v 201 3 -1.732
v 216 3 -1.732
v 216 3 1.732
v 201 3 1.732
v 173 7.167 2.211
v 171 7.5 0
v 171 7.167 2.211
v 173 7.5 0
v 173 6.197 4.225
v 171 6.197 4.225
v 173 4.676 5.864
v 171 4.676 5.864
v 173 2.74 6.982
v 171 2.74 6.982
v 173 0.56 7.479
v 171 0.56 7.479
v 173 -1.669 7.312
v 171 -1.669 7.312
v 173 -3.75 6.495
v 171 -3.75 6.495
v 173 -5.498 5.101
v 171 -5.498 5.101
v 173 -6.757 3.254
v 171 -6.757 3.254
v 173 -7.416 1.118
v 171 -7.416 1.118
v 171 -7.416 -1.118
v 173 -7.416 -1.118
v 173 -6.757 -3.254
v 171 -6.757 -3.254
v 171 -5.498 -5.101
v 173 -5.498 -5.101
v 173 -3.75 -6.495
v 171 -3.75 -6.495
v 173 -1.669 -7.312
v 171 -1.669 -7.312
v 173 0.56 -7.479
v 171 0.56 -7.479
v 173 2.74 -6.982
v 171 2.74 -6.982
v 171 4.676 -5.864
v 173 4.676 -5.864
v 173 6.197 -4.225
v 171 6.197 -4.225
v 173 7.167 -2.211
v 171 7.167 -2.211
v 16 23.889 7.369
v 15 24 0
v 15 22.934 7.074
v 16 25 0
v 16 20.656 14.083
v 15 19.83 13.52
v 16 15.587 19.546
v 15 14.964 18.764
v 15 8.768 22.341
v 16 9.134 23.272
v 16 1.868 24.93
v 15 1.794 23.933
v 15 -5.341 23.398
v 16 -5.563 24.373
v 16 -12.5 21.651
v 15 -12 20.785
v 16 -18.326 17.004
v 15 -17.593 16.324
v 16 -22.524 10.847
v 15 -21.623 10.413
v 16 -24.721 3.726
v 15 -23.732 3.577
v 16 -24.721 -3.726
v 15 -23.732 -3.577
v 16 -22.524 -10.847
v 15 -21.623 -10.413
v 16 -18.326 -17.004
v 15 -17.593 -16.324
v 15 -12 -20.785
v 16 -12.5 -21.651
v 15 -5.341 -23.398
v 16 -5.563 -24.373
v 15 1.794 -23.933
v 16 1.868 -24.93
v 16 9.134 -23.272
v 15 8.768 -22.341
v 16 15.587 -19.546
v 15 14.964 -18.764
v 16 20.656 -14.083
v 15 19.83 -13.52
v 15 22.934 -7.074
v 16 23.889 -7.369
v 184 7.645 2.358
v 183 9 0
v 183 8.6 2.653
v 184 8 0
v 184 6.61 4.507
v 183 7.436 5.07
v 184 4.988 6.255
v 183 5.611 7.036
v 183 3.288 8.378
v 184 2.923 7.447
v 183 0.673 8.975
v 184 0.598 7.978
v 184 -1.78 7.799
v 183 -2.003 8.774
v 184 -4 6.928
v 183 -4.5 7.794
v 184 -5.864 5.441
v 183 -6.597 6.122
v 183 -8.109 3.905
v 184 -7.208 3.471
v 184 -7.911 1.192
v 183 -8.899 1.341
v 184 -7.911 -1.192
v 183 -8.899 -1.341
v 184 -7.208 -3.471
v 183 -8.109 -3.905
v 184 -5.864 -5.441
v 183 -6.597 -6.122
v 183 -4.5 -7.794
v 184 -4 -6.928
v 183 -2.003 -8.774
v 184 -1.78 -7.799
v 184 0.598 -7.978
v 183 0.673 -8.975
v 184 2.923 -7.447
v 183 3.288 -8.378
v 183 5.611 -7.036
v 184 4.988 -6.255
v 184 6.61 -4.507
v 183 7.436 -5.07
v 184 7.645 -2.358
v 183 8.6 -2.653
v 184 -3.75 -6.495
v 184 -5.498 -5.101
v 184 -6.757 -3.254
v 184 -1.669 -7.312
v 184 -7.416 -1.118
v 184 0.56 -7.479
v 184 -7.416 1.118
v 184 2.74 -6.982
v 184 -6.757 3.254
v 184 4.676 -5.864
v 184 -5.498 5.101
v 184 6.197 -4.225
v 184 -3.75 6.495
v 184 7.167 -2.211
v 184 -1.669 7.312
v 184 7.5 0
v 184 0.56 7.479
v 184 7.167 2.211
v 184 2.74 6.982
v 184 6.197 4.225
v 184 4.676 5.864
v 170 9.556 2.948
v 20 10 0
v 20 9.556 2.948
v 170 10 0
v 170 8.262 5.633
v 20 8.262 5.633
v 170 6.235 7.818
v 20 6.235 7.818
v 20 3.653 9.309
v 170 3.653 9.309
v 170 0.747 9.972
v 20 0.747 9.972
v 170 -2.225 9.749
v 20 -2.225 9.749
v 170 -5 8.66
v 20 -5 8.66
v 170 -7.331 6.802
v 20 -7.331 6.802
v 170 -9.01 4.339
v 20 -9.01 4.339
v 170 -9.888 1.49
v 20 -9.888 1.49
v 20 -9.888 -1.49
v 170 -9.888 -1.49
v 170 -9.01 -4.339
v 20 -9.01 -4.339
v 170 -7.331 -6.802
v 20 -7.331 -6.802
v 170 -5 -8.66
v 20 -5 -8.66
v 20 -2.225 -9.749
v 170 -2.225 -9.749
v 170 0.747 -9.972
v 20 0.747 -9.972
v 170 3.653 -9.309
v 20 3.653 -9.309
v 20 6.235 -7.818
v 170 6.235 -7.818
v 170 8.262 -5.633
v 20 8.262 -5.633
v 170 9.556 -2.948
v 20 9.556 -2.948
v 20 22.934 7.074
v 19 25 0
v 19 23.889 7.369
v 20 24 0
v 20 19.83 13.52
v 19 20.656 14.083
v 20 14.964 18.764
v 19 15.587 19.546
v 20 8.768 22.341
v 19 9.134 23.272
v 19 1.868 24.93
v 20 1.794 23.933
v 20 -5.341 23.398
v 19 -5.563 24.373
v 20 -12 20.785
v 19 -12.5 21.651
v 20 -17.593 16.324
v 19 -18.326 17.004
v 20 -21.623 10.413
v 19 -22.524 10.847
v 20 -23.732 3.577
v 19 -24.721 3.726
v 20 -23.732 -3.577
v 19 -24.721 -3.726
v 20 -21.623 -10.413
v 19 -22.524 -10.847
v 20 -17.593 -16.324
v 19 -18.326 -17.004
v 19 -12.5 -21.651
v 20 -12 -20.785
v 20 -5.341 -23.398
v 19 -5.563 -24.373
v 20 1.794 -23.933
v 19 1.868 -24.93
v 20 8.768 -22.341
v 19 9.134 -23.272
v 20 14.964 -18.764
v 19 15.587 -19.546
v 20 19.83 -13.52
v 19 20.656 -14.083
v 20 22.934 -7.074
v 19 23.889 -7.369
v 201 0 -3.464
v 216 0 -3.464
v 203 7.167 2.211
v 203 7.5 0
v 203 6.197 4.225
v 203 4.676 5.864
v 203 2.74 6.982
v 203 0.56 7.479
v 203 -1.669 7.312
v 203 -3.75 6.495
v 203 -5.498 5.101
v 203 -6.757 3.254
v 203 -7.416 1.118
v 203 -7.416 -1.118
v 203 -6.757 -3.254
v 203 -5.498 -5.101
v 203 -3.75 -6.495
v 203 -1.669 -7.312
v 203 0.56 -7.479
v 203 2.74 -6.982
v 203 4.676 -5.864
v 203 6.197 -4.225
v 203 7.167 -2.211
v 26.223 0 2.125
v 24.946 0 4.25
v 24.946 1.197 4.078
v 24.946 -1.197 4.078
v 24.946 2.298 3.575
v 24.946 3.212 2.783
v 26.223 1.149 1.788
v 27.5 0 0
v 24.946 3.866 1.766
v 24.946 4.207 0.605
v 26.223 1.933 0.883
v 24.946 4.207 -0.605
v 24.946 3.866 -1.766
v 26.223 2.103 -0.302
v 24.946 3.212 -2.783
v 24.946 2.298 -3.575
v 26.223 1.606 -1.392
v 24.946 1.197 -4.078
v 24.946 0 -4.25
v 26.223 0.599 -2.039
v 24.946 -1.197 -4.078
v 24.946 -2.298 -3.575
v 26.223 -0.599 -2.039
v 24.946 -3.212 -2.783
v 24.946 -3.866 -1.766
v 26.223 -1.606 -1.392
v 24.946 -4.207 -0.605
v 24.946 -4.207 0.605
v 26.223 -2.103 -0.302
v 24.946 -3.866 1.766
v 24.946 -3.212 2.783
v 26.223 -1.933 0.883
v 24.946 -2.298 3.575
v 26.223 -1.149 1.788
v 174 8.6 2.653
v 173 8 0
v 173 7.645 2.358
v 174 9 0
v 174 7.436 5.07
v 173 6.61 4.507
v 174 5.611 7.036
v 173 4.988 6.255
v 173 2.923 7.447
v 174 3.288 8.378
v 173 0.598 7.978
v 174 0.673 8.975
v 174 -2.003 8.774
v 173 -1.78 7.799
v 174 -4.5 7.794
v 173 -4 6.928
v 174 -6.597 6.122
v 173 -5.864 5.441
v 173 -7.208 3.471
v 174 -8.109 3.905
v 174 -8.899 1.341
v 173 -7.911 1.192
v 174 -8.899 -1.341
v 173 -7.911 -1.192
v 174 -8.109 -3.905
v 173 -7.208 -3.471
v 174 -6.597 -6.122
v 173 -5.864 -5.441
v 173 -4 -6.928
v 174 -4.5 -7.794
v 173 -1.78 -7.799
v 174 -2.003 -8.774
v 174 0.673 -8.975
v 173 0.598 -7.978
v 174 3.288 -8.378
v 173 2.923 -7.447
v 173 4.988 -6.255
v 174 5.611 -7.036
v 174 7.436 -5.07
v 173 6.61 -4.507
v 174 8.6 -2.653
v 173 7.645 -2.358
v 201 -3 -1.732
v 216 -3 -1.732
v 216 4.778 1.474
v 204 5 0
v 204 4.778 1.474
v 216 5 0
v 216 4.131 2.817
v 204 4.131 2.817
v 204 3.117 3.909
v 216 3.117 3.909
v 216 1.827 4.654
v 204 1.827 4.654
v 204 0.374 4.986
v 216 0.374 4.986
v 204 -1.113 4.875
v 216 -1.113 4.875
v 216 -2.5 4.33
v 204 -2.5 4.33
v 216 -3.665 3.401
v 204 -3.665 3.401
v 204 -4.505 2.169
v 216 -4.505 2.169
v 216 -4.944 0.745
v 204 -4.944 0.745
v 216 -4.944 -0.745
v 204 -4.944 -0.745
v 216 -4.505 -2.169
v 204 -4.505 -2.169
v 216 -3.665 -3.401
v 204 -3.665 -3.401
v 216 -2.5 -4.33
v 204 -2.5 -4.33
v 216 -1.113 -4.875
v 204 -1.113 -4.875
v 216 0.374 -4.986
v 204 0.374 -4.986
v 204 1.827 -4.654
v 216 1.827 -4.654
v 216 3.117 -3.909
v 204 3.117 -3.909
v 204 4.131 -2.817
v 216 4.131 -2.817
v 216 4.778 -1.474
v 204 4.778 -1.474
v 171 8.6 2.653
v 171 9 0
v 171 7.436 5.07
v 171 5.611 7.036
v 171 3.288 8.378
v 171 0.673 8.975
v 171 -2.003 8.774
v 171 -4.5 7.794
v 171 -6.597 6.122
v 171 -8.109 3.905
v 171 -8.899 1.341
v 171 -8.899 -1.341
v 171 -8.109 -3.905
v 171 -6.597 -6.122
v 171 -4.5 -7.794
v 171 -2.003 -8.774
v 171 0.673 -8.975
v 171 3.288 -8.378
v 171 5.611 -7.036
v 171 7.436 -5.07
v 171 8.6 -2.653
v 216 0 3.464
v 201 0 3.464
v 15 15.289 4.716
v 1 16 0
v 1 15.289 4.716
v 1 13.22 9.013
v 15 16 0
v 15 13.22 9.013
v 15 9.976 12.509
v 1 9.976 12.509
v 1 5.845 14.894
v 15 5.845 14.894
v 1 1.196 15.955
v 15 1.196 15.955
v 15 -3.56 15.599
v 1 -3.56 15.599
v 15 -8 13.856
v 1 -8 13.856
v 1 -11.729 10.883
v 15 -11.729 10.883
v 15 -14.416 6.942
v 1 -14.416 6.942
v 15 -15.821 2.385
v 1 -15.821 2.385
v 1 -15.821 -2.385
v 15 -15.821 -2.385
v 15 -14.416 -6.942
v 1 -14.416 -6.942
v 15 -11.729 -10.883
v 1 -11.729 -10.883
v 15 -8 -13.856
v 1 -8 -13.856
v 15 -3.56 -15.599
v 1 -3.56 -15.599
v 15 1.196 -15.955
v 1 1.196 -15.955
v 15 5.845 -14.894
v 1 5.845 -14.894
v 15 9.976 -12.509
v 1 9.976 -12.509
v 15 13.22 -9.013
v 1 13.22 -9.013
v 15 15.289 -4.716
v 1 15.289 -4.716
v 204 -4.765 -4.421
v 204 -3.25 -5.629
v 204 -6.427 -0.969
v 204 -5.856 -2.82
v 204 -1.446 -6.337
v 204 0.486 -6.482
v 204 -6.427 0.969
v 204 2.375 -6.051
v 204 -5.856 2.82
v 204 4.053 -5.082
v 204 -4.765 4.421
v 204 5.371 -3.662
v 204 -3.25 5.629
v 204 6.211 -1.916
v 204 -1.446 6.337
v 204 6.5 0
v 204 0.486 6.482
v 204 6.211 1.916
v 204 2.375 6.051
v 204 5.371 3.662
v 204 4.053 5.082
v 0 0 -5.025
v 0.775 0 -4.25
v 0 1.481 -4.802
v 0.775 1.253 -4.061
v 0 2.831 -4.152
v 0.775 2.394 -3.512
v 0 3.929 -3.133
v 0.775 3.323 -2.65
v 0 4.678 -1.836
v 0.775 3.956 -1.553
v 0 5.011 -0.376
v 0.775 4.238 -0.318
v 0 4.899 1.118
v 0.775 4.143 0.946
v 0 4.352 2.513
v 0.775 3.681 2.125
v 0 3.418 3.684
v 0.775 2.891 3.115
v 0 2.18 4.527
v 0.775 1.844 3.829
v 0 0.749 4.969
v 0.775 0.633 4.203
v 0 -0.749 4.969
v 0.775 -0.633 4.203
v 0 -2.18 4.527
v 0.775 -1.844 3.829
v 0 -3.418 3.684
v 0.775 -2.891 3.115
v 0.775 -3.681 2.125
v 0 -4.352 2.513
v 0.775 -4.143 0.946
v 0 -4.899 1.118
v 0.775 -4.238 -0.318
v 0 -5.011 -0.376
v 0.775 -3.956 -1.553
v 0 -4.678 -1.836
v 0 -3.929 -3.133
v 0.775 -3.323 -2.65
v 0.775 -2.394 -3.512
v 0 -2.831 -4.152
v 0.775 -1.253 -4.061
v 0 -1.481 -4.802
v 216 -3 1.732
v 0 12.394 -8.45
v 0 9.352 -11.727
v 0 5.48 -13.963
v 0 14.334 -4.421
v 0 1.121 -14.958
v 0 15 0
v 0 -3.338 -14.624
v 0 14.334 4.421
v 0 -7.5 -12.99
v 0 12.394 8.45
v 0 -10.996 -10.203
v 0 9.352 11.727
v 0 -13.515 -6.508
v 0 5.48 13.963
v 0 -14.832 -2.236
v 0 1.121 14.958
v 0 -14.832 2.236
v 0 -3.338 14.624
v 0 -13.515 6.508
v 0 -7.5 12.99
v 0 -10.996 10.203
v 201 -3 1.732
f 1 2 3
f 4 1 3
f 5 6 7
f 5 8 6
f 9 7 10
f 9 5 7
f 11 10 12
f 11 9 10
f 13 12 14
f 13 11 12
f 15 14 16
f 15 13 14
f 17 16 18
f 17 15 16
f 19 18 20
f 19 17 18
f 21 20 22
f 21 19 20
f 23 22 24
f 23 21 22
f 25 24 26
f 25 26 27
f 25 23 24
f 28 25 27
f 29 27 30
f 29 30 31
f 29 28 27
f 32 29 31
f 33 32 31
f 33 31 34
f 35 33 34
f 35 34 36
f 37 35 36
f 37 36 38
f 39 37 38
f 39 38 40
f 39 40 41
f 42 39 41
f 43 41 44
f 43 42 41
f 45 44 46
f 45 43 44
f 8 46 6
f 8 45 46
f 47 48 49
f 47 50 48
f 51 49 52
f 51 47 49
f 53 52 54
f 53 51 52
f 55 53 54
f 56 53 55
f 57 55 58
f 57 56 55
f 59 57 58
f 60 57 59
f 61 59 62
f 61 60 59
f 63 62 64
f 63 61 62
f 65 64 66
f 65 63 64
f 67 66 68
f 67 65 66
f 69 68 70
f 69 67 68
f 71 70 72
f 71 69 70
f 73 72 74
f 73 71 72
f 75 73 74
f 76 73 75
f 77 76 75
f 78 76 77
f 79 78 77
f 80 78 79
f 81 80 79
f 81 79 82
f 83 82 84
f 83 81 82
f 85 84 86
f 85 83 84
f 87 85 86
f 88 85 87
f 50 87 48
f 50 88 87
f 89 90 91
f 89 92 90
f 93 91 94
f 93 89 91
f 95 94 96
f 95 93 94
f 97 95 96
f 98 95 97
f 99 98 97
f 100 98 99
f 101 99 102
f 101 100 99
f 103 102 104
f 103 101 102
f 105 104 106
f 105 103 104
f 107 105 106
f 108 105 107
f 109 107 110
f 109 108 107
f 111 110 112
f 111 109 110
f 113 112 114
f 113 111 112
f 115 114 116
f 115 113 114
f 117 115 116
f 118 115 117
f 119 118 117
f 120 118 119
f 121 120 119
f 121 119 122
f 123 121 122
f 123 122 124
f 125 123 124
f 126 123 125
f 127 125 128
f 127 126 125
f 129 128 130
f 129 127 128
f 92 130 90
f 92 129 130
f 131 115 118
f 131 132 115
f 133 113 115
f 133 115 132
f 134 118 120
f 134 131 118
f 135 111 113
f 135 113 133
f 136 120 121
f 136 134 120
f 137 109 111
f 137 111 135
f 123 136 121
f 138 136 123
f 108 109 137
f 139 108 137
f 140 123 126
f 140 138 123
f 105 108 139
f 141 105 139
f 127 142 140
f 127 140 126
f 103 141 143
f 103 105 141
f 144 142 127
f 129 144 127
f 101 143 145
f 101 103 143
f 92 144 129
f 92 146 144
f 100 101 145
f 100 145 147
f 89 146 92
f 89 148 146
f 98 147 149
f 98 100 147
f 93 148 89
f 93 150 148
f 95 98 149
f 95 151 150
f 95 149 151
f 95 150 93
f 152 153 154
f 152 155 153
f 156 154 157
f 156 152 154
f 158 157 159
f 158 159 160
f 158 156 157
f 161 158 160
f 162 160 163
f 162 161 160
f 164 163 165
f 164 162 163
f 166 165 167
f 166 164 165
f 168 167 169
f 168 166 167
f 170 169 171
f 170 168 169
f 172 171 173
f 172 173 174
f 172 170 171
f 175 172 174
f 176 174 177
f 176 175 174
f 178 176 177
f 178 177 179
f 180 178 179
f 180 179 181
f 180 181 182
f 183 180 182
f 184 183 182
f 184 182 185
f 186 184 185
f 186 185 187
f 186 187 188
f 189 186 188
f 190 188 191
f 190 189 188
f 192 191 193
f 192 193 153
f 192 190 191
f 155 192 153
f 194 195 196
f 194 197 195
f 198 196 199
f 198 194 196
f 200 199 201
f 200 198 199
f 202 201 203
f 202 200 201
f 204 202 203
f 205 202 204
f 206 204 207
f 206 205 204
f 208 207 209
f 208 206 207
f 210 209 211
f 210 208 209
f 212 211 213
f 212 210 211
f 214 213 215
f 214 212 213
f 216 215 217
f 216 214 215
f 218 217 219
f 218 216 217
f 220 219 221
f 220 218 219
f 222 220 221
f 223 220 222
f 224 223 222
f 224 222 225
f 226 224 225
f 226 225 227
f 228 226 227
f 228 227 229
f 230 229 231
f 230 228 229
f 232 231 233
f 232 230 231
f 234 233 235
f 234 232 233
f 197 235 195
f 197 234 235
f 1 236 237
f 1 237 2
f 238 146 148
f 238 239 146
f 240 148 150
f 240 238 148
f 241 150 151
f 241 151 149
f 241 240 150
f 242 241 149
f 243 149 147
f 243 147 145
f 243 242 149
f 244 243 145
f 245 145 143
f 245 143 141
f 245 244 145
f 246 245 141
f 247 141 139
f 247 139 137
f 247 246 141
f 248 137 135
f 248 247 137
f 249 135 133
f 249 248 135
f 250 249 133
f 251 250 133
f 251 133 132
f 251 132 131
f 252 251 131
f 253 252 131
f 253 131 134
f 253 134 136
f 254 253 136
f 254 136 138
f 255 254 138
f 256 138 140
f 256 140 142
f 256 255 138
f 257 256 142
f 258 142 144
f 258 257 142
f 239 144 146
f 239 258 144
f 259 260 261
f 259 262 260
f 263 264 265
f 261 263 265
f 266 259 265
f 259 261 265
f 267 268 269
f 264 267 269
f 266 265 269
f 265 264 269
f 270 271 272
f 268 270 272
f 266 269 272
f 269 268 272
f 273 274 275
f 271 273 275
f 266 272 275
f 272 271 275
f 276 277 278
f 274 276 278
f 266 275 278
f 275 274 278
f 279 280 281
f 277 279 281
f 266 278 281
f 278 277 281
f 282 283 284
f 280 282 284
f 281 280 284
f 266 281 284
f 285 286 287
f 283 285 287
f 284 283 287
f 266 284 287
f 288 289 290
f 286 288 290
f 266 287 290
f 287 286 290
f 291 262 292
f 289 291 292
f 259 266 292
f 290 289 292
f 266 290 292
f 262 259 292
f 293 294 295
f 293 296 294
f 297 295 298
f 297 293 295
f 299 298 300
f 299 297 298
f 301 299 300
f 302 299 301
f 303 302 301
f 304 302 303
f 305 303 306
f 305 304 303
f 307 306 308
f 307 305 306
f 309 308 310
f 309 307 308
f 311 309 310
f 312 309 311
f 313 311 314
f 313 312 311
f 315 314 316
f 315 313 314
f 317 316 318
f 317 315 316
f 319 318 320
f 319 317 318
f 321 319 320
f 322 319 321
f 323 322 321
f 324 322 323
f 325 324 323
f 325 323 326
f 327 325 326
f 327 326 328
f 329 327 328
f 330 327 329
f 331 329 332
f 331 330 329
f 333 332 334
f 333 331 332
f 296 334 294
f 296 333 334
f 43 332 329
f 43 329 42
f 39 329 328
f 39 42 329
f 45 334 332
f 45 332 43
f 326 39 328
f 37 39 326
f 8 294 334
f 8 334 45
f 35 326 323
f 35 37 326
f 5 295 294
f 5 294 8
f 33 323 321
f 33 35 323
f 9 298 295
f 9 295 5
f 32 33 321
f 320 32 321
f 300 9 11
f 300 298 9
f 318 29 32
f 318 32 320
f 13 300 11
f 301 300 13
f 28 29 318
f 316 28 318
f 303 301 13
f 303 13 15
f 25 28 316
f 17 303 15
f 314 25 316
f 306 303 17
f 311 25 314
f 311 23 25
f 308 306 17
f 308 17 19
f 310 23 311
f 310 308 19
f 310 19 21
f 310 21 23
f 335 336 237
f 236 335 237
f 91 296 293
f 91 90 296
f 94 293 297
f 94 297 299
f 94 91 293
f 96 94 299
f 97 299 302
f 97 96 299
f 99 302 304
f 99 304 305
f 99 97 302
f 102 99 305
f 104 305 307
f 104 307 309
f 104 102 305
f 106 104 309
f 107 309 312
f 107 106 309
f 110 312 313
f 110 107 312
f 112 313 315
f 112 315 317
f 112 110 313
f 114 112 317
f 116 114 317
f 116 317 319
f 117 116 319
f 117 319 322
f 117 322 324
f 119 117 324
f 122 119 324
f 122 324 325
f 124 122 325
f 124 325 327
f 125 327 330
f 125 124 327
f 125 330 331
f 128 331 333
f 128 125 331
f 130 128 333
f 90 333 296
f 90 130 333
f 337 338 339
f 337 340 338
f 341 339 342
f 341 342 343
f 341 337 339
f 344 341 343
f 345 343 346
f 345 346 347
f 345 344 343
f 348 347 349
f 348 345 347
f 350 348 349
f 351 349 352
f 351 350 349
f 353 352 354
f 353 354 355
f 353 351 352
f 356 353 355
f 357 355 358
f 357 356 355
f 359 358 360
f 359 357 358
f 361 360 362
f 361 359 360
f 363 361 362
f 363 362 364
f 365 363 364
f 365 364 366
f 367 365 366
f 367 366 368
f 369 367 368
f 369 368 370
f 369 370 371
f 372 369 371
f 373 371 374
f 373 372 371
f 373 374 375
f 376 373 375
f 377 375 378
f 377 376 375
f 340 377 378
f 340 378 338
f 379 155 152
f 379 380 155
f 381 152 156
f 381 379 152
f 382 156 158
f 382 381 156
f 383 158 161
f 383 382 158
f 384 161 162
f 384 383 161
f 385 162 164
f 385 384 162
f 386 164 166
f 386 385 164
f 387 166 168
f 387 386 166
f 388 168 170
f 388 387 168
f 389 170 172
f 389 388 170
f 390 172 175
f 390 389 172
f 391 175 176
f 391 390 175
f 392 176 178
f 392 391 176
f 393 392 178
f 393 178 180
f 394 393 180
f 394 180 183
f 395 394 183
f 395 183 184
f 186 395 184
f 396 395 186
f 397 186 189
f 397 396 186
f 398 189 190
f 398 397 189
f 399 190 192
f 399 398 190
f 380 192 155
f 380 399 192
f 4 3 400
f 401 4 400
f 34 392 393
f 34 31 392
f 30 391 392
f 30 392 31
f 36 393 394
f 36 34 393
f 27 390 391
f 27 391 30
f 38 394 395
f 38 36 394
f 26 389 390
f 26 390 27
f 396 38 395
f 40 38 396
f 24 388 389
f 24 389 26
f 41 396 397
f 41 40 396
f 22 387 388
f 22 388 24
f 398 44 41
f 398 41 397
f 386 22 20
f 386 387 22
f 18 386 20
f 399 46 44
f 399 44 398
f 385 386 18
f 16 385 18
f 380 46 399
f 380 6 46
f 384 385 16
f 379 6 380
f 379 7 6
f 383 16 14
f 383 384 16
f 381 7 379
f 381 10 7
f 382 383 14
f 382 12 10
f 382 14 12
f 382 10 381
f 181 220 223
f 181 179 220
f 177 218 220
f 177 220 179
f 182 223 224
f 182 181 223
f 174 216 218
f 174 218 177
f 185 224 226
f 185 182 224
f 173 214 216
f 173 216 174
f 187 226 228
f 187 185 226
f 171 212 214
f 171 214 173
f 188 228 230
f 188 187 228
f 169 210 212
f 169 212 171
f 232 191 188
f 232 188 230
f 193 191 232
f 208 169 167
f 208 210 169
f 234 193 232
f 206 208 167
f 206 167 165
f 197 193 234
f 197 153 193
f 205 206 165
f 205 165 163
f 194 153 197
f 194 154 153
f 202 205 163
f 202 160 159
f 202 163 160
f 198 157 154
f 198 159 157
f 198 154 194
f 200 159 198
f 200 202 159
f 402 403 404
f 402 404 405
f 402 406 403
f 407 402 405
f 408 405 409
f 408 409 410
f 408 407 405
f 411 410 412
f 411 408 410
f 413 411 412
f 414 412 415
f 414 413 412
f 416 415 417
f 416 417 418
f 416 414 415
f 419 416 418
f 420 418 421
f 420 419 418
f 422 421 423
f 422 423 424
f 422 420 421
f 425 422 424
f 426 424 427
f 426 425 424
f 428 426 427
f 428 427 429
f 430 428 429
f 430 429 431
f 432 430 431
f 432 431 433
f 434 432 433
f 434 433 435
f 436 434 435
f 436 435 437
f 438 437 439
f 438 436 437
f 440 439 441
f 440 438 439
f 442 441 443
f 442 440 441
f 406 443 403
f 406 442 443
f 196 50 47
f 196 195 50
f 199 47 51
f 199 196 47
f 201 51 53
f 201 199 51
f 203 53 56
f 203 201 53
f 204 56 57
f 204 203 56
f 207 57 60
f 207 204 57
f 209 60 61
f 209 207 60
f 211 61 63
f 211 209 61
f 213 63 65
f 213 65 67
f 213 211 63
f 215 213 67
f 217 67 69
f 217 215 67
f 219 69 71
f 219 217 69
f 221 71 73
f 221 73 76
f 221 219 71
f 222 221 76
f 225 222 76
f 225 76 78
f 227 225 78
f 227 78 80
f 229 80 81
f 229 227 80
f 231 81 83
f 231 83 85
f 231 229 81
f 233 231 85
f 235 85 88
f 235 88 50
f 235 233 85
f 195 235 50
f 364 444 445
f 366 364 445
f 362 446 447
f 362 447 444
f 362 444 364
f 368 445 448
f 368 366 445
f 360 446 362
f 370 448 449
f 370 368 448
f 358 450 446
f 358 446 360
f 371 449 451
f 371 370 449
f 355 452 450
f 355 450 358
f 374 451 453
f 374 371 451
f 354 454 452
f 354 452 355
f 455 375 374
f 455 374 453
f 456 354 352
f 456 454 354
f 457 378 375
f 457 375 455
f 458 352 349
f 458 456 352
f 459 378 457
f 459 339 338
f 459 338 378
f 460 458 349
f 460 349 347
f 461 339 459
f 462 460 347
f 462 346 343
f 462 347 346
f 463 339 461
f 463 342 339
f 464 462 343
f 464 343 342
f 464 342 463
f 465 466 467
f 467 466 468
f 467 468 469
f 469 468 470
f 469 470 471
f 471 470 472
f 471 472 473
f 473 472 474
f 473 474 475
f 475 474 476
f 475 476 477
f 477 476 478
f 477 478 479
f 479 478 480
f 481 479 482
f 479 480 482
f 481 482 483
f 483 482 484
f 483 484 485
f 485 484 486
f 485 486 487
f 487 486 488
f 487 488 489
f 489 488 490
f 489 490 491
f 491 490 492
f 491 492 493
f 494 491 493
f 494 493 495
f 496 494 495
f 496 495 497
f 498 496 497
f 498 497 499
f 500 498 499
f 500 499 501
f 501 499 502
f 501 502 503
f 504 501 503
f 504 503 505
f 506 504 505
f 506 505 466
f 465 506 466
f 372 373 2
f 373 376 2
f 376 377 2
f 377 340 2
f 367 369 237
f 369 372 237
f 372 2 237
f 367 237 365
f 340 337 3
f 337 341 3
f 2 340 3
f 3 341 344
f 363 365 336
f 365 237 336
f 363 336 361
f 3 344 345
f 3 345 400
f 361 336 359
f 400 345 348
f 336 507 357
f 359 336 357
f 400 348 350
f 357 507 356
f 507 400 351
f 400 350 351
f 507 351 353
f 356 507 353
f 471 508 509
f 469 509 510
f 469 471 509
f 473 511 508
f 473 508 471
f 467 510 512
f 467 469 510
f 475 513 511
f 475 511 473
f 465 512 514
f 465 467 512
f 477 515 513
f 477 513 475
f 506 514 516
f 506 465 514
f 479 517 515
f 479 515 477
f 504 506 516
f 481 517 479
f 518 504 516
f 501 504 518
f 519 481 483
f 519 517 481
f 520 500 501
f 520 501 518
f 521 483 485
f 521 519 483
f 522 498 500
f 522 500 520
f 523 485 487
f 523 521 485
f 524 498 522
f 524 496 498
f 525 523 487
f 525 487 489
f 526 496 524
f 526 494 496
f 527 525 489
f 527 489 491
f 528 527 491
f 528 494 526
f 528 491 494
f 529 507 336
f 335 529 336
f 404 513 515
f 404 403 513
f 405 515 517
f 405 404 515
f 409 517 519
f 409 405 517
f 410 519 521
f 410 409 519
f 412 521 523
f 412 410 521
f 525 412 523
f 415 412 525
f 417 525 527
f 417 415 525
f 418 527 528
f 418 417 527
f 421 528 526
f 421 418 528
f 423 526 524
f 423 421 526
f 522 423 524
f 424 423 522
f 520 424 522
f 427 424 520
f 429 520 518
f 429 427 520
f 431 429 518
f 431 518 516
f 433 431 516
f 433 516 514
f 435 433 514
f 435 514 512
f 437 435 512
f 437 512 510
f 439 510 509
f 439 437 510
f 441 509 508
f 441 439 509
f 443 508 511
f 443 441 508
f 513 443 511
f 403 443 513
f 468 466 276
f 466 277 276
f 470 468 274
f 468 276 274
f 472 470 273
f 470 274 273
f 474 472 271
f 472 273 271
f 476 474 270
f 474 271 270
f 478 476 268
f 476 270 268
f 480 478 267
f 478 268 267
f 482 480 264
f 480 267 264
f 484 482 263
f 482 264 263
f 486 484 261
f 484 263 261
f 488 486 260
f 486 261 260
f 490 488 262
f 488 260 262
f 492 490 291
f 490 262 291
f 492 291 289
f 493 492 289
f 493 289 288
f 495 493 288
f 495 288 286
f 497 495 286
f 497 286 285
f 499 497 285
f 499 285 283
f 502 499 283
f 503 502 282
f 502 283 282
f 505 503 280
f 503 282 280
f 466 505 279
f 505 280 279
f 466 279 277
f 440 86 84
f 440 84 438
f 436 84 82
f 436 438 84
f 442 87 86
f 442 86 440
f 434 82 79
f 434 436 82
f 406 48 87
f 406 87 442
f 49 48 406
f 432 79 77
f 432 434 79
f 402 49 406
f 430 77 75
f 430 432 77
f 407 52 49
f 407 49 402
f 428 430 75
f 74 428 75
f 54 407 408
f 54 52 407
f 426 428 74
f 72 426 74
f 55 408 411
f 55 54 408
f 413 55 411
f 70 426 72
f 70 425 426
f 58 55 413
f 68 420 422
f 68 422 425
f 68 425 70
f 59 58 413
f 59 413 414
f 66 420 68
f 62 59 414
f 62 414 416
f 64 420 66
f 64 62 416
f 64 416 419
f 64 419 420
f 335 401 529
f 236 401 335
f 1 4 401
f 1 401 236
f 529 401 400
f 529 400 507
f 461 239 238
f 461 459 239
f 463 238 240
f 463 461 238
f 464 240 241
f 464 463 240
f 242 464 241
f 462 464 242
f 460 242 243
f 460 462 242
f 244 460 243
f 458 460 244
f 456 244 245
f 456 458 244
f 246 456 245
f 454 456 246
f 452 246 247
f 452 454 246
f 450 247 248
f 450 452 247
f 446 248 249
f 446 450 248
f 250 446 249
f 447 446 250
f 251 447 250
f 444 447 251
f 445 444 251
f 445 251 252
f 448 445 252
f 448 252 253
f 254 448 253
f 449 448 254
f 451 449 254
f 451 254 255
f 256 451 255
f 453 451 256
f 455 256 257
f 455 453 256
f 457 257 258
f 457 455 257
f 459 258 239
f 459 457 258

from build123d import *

# Parameters (mm, degrees)
HOLE_WIZARD_M101_D           = 8.5
HOLE_WIZARD_M101_DEPTH       = 24.946342369
HOLE_WIZARD_M101_CSINK_D     = 10.05
HOLE_WIZARD_M101_CSINK_ANGLE = 90
HOLE_WIZARD_M101_TIP         = 2.553657631
CUT_EXTRUDE_1_DEPTH          = 15


with BuildPart() as part:
    # Эскиз1 → Повернуть1 (revolve)
    with BuildSketch(Plane.XY):
        Polygon((0, 0), (0, 15), (1, 16), (15, 16), (15, 24), (16, 25), (19, 25), (20, 24), (20, 10), (170, 10), (171, 9), (171, 7.5), (173, 7.5), (173, 8), (174, 9), (183, 9), (184, 8), (184, 7.5), (203, 7.5), (204, 6.5), (204, 5), (216, 5), (216, 4), (216, 0), align=None)
    revolve(axis=Axis((0, 0, 0), (1, 0, 0)))

    # Отверстие обработанное метчиком M101
    with Locations(Plane.ZY):
        with Locations((0, 0)):
            CounterSinkHole(HOLE_WIZARD_M101_D / 2, HOLE_WIZARD_M101_CSINK_D / 2, depth=HOLE_WIZARD_M101_DEPTH, counter_sink_angle=HOLE_WIZARD_M101_CSINK_ANGLE)
            with Locations((0, 0, -(HOLE_WIZARD_M101_DEPTH + HOLE_WIZARD_M101_TIP / 2))):  # 118° drill point
                Cone(0, HOLE_WIZARD_M101_D / 2, HOLE_WIZARD_M101_TIP, mode=Mode.SUBTRACT)

    # Эскиз5 → Вырез-Вытянуть1 (cut)
    with BuildSketch(Plane(origin=(216, 0, 0), x_dir=(0, 0, -1), z_dir=(1, 0, 0))):
        Polygon((3.464101615, 0), (1.732050808, 3), (-1.732050808, 3), (-3.464101615, 0), (-1.732050808, -3), (1.732050808, -3), align=None)
    extrude(amount=-CUT_EXTRUDE_1_DEPTH, mode=Mode.SUBTRACT)


solid = part.part
